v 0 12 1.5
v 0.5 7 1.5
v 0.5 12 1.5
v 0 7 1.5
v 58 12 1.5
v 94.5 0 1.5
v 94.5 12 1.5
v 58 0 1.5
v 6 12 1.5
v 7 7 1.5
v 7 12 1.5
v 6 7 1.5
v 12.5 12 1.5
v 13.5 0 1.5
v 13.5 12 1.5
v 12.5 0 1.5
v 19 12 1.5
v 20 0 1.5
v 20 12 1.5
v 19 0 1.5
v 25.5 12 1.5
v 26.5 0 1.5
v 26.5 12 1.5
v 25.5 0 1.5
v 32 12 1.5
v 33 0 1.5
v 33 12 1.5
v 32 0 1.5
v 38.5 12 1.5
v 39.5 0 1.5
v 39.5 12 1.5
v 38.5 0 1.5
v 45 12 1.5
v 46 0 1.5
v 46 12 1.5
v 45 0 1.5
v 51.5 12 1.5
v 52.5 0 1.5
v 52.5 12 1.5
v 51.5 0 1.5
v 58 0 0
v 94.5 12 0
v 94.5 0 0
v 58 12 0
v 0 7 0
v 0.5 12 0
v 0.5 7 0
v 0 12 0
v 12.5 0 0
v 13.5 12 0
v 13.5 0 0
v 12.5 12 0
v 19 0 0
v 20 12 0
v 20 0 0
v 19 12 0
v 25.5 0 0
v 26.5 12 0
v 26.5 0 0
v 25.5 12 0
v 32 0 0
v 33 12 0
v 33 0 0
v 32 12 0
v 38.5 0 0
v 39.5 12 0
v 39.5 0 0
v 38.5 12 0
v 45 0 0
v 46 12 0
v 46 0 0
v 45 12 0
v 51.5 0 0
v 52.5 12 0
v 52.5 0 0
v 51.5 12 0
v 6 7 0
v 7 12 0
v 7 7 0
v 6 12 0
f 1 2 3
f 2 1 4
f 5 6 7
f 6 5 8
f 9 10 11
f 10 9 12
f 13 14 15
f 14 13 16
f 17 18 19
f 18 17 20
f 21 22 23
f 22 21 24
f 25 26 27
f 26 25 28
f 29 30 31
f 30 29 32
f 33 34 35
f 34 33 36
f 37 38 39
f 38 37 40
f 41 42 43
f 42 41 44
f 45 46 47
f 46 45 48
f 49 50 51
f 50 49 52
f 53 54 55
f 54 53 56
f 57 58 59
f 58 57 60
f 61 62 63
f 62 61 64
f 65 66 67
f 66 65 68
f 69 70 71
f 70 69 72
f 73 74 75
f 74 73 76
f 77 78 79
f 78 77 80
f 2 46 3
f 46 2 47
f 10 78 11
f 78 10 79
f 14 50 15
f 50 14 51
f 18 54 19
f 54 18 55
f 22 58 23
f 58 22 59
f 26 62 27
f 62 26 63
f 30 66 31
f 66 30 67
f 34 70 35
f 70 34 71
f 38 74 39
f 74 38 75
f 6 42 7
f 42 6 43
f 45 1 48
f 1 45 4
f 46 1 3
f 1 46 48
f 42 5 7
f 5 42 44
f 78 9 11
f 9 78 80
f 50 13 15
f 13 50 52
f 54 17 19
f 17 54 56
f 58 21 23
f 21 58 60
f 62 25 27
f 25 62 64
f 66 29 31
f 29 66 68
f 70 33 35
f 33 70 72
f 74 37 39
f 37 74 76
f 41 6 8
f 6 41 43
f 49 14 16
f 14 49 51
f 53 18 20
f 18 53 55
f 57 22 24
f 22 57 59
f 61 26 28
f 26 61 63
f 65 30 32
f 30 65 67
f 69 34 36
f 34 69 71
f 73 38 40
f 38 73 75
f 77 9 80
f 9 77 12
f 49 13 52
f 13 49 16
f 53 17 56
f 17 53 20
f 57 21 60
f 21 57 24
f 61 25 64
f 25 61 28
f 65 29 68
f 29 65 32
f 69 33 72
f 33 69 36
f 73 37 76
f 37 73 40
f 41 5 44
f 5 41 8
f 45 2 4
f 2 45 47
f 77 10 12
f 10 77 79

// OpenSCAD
// Agarose gel comb - a flat plate with a back bar and a row of rectangular teeth, for casting
// horizontal (flat) gels. NOVEL general part.
//

cols   = 10;
teeth_d = 5.0;
teeth_l = 12;
spine_w = 12;
pitch   = 1.5;
t       = 1.5;

$fn = 48;

P = max(pitch, teeth_d + 1.5);                 // centre-to-centre spacing
L = spine_w + 2 * teeth_l + (cols - 1) * P;   // total X span
w = spine_w;                                  // constant width (Y)

difference() {
    union() {
        cube([L, w, t]);                       // base plate
        for (i = [0 : cols - 1])
            translate([-(spine_w / 2) + i * P, -(w / 2 + teeth_l), 0])
                cube([teeth_d, w + 2 * teeth_l, t]);   // teeth (overhang the front edge)
    }
    // channel: a spine along the back edge and a groove under each tooth, open at the top (z = t)
    for (i = [0 : cols - 1])
        translate([-(spine_w / 2) + i * P, -(w / 2 + teeth_l), -1])
            cube([teeth_d + 0.5, w + 2 * teeth_l, t + 2]);
    translate([0, -w / 2 - 1, -1]) cube([spine_w, w + 2, t + 2]);   // back bar groove
}
